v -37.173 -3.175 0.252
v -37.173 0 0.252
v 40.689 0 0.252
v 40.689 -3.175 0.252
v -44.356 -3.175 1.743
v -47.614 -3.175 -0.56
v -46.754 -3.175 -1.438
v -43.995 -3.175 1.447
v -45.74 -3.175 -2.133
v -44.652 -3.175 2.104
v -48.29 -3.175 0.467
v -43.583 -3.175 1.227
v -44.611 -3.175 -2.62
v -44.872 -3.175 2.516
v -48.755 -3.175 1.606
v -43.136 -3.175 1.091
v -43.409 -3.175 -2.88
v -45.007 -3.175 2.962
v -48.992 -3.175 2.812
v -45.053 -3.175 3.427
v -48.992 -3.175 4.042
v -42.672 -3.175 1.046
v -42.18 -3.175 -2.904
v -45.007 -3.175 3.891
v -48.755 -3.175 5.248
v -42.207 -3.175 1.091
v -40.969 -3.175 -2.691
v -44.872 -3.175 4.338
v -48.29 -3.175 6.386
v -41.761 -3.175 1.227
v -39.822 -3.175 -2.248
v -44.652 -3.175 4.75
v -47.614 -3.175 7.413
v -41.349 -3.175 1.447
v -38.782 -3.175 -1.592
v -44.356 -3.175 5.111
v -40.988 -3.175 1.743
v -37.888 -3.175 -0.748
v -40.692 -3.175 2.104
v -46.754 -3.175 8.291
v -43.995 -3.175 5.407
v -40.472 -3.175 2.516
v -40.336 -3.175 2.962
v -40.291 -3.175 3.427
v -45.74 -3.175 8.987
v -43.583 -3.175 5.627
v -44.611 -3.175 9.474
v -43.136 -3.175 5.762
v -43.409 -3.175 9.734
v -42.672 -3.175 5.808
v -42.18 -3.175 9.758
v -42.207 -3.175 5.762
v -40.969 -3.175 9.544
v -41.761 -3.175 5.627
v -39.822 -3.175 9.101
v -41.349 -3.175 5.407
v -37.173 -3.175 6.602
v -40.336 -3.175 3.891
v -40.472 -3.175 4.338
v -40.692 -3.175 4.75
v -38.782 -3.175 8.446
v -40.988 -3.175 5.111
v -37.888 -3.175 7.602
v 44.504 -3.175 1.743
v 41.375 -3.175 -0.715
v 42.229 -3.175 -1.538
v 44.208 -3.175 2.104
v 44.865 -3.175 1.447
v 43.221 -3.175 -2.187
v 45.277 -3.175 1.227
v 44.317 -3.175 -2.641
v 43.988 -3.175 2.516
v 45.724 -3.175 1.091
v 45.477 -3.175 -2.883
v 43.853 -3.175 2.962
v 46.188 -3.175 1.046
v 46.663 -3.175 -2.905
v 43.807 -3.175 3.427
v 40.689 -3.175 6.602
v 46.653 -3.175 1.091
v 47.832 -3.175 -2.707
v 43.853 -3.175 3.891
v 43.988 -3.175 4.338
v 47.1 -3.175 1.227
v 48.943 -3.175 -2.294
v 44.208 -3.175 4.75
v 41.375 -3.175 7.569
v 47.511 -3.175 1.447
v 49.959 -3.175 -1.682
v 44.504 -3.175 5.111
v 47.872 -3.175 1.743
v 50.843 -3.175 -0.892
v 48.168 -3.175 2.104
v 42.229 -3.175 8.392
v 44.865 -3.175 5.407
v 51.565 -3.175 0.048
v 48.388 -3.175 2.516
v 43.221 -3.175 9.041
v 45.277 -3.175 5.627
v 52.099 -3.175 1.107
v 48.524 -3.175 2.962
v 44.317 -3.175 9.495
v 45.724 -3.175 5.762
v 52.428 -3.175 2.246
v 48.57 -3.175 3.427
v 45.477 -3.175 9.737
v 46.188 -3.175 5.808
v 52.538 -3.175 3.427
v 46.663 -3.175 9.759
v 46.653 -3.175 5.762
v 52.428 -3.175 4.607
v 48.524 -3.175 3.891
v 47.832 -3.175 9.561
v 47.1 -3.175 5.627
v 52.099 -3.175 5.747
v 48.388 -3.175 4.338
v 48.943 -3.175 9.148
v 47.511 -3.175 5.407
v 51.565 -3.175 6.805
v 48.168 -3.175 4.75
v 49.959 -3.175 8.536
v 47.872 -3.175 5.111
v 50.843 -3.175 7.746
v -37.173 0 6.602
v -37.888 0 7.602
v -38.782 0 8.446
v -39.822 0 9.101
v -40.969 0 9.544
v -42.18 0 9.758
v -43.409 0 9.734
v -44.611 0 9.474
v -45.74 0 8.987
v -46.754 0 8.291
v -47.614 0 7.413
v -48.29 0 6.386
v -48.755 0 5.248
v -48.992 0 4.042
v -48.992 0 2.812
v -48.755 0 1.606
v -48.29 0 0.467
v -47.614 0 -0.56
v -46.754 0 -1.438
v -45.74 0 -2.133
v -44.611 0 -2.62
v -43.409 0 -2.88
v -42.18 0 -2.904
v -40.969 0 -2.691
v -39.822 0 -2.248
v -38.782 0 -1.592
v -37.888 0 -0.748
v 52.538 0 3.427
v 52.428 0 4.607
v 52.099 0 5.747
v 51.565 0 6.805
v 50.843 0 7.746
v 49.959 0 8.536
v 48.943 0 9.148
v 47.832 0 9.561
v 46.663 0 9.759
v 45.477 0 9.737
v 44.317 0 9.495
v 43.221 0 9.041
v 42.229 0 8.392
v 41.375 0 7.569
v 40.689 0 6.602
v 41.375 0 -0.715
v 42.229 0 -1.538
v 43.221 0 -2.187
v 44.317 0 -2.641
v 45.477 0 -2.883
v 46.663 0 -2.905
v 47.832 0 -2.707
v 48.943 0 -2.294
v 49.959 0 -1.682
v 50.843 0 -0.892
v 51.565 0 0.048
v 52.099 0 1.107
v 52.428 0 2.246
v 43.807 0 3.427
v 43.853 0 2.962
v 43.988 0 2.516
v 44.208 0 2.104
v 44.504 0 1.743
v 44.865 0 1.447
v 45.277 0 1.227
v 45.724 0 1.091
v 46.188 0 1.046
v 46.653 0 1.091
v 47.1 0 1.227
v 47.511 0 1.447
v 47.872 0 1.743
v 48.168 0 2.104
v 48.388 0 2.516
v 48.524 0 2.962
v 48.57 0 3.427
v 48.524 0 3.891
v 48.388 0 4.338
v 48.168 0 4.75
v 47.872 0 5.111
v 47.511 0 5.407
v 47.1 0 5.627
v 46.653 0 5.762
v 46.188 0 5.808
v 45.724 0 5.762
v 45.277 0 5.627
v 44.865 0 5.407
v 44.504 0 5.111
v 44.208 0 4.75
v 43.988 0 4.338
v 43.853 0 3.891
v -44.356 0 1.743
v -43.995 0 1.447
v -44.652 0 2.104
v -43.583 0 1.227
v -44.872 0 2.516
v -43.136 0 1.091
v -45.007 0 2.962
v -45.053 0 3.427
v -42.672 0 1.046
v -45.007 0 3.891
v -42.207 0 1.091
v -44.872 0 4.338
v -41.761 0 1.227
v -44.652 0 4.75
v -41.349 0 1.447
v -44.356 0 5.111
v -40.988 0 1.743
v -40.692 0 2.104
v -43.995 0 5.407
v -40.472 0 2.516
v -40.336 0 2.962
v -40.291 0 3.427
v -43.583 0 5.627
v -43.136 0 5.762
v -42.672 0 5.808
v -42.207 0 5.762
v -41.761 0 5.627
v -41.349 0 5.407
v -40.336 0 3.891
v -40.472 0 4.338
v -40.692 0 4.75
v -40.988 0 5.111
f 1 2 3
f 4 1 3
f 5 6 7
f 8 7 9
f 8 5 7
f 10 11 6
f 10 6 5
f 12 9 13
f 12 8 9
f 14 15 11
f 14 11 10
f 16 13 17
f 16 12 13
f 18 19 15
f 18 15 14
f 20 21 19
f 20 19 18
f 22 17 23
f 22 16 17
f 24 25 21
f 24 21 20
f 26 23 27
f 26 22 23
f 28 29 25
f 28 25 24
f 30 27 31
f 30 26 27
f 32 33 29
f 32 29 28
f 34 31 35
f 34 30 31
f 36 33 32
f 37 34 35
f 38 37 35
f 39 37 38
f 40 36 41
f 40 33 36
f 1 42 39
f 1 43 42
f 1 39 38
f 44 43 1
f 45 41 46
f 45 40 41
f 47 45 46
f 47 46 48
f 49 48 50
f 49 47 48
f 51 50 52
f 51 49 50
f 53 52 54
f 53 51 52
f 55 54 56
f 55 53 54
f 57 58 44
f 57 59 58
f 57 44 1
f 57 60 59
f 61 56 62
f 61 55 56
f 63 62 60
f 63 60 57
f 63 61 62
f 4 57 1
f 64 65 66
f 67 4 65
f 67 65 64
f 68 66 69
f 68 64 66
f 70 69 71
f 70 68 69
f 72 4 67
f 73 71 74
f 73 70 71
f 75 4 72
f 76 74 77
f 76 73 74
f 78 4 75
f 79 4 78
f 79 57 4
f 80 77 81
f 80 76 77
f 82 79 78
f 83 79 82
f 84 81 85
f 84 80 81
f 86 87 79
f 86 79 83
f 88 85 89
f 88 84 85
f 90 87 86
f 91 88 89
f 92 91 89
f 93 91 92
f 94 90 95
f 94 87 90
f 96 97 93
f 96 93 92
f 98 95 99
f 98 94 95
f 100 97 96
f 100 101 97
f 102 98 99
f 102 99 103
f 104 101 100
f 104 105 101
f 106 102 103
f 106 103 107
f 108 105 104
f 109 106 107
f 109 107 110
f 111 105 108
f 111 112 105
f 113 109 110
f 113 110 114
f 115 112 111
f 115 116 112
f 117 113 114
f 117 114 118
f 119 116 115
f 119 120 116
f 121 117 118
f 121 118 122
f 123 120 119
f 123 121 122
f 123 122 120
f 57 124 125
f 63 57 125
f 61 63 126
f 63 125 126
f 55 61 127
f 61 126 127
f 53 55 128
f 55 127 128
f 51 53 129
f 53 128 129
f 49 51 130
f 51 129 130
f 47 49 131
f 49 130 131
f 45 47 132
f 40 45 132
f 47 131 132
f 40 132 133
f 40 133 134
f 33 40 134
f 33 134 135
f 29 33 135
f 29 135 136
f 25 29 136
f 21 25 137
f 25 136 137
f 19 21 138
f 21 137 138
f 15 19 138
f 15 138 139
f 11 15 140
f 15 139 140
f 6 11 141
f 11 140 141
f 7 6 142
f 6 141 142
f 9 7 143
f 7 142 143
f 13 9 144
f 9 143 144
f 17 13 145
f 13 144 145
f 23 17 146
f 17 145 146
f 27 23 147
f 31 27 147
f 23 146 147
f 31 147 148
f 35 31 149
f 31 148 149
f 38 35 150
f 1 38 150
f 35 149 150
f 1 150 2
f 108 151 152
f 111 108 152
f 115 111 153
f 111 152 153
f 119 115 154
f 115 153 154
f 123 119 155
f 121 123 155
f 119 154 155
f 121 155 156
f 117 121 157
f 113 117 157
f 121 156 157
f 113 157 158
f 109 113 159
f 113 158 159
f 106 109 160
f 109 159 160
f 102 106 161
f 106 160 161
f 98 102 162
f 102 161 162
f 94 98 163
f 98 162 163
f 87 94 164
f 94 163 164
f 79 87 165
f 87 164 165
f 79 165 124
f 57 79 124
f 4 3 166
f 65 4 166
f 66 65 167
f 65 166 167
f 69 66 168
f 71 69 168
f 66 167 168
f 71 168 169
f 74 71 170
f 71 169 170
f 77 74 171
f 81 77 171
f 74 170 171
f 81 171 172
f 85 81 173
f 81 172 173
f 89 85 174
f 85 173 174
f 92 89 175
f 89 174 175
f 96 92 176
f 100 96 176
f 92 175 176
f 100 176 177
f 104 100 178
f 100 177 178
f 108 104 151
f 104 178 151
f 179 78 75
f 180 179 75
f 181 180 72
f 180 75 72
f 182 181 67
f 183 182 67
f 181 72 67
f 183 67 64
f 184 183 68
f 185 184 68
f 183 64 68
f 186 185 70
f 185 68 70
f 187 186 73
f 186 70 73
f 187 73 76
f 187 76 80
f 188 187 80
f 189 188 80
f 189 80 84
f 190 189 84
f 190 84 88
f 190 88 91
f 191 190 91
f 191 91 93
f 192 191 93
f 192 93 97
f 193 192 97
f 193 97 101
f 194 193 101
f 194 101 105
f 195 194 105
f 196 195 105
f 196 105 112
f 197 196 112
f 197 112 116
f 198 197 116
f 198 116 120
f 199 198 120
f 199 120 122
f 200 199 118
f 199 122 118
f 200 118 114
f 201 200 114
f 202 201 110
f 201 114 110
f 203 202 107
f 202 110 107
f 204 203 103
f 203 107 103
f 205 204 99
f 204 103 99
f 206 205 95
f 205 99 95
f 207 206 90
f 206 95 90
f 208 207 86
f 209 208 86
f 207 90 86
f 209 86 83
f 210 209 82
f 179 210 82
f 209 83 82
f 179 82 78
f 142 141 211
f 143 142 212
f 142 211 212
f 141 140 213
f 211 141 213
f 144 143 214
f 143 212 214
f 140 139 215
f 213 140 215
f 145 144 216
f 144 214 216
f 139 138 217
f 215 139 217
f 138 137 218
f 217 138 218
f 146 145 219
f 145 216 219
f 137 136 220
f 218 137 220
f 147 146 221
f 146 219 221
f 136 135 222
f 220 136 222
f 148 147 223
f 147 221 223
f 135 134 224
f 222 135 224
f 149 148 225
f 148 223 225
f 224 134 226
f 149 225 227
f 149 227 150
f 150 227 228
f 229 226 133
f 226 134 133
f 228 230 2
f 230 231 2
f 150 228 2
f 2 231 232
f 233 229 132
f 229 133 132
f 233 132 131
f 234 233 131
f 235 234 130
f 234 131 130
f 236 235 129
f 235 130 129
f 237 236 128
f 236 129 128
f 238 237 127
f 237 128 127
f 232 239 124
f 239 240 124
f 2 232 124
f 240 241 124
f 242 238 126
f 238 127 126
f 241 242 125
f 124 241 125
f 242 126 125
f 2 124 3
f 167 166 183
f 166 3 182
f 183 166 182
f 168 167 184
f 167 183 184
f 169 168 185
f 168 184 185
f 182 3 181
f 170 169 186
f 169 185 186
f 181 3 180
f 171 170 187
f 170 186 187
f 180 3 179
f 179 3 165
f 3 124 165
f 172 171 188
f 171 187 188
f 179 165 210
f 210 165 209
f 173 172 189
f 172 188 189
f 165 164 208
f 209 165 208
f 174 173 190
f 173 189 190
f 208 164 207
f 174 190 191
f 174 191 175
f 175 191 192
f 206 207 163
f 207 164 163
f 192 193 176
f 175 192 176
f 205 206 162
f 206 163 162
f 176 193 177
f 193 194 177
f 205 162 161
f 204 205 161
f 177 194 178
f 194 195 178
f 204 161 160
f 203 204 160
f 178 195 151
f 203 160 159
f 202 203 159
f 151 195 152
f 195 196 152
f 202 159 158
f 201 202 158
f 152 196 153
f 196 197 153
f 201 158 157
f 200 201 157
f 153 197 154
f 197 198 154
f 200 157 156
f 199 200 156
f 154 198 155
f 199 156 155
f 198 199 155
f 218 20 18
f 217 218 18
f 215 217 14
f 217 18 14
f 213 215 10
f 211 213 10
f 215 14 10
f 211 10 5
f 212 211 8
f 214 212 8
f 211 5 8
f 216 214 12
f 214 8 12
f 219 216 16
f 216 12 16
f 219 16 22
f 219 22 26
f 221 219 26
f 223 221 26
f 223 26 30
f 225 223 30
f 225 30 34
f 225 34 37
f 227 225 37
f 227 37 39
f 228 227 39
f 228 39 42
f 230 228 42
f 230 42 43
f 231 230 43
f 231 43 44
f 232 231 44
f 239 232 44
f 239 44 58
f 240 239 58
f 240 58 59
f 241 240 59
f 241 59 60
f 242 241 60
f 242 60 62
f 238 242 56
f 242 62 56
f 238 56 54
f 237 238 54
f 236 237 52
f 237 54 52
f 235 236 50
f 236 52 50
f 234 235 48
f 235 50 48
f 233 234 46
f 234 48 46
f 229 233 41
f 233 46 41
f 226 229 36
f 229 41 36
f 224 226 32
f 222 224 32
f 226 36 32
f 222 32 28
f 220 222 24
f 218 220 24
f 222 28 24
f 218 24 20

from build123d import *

# Parameters (mm, degrees)
F1_DEPTH = 3.175
F2_D     = 4.7625
F3_D     = 4.7625


with BuildPart() as f1:
    # F0 (on Front) → F1 (new body)
    with BuildSketch(Plane.XZ):
        with BuildLine():
            Line((40.6890114234, 6.6018716117), (-37.1726150847, 6.6018716117))
            ThreePointArc((-37.1726150847, 6.6018716117), (-36.5382474018, 5.0703725481), (-36.3218763988, 3.4268716117))
            ThreePointArc((-36.3218763988, 3.4268716117), (-36.5382474018, 1.7833706753), (-37.1726150847, 0.2518716117))
            Line((-37.1726150847, 0.2518716117), (40.6890110201, 0.2518716117))
            ThreePointArc((40.6890110201, 0.2518716117), (39.8382725358, 3.4268716658), (40.6890114234, 6.6018716117))
        make_face()
        with BuildLine():
            Line((-37.1726150847, 6.6018716117), (-42.6718763988, 6.6018716117))
            Line((-42.6718763988, 6.6018716117), (-42.6718763988, 0.2518716117))
            Line((-42.6718763988, 0.2518716117), (-37.1726150847, 0.2518716117))
            ThreePointArc((-37.1726150847, 0.2518716117), (-36.5382474018, 1.7833706753), (-36.3218763988, 3.4268716117))
            ThreePointArc((-36.3218763988, 3.4268716117), (-36.5382474018, 5.0703725481), (-37.1726150847, 6.6018716117))
        make_face()
        with BuildLine():
            Line((-42.6718763988, 0.2518716117), (-42.6718763988, 6.6018716117))
            Line((-42.6718763988, 6.6018716117), (-37.1726150847, 6.6018716117))
            ThreePointArc((-37.1726150847, 6.6018716117), (-49.0218763988, 3.4268716117), (-37.1726150847, 0.2518716117))
            Line((-37.1726150847, 0.2518716117), (-42.6718763988, 0.2518716117))
        make_face()
        with BuildLine():
            ThreePointArc((52.5382725358, 3.4268712625), (47.831773667, 9.5605002072), (40.6890114234, 6.6018716117))
            Line((40.6890114234, 6.6018716117), (46.2281236012, 6.6018716117))
            Line((46.2281236012, 6.6018716117), (46.2281236012, 0.2518716117))
            Line((46.2281236012, 0.2518716117), (40.6890110201, 0.2518716117))
            ThreePointArc((40.6890110201, 0.2518716117), (47.8317732774, -2.7067577866), (52.5382725358, 3.4268712625))
        make_face()
        with BuildLine():
            Line((46.2281236012, 6.6018716117), (40.6890114234, 6.6018716117))
            ThreePointArc((40.6890114234, 6.6018716117), (39.8382725358, 3.4268716658), (40.6890110201, 0.2518716117))
            Line((40.6890110201, 0.2518716117), (46.2281236012, 0.2518716117))
            Line((46.2281236012, 0.2518716117), (46.2281236012, 6.6018716117))
        make_face()
    extrude(amount=F1_DEPTH)

    # F2 (through all)
    with Locations(Plane(origin=(0, 0, 0), x_dir=(1, 0, 0), z_dir=(0, 1, 0))):
        with Locations((-42.6718763988, -3.4268716117)):
            Hole(F2_D / 2)

    # F3 (through all)
    with Locations(Plane(origin=(0, 0, 0), x_dir=(1, 0, 0), z_dir=(0, 1, 0))):
        with Locations((46.1882725358, -3.4268712625)):
            Hole(F3_D / 2)


solid = f1.part
